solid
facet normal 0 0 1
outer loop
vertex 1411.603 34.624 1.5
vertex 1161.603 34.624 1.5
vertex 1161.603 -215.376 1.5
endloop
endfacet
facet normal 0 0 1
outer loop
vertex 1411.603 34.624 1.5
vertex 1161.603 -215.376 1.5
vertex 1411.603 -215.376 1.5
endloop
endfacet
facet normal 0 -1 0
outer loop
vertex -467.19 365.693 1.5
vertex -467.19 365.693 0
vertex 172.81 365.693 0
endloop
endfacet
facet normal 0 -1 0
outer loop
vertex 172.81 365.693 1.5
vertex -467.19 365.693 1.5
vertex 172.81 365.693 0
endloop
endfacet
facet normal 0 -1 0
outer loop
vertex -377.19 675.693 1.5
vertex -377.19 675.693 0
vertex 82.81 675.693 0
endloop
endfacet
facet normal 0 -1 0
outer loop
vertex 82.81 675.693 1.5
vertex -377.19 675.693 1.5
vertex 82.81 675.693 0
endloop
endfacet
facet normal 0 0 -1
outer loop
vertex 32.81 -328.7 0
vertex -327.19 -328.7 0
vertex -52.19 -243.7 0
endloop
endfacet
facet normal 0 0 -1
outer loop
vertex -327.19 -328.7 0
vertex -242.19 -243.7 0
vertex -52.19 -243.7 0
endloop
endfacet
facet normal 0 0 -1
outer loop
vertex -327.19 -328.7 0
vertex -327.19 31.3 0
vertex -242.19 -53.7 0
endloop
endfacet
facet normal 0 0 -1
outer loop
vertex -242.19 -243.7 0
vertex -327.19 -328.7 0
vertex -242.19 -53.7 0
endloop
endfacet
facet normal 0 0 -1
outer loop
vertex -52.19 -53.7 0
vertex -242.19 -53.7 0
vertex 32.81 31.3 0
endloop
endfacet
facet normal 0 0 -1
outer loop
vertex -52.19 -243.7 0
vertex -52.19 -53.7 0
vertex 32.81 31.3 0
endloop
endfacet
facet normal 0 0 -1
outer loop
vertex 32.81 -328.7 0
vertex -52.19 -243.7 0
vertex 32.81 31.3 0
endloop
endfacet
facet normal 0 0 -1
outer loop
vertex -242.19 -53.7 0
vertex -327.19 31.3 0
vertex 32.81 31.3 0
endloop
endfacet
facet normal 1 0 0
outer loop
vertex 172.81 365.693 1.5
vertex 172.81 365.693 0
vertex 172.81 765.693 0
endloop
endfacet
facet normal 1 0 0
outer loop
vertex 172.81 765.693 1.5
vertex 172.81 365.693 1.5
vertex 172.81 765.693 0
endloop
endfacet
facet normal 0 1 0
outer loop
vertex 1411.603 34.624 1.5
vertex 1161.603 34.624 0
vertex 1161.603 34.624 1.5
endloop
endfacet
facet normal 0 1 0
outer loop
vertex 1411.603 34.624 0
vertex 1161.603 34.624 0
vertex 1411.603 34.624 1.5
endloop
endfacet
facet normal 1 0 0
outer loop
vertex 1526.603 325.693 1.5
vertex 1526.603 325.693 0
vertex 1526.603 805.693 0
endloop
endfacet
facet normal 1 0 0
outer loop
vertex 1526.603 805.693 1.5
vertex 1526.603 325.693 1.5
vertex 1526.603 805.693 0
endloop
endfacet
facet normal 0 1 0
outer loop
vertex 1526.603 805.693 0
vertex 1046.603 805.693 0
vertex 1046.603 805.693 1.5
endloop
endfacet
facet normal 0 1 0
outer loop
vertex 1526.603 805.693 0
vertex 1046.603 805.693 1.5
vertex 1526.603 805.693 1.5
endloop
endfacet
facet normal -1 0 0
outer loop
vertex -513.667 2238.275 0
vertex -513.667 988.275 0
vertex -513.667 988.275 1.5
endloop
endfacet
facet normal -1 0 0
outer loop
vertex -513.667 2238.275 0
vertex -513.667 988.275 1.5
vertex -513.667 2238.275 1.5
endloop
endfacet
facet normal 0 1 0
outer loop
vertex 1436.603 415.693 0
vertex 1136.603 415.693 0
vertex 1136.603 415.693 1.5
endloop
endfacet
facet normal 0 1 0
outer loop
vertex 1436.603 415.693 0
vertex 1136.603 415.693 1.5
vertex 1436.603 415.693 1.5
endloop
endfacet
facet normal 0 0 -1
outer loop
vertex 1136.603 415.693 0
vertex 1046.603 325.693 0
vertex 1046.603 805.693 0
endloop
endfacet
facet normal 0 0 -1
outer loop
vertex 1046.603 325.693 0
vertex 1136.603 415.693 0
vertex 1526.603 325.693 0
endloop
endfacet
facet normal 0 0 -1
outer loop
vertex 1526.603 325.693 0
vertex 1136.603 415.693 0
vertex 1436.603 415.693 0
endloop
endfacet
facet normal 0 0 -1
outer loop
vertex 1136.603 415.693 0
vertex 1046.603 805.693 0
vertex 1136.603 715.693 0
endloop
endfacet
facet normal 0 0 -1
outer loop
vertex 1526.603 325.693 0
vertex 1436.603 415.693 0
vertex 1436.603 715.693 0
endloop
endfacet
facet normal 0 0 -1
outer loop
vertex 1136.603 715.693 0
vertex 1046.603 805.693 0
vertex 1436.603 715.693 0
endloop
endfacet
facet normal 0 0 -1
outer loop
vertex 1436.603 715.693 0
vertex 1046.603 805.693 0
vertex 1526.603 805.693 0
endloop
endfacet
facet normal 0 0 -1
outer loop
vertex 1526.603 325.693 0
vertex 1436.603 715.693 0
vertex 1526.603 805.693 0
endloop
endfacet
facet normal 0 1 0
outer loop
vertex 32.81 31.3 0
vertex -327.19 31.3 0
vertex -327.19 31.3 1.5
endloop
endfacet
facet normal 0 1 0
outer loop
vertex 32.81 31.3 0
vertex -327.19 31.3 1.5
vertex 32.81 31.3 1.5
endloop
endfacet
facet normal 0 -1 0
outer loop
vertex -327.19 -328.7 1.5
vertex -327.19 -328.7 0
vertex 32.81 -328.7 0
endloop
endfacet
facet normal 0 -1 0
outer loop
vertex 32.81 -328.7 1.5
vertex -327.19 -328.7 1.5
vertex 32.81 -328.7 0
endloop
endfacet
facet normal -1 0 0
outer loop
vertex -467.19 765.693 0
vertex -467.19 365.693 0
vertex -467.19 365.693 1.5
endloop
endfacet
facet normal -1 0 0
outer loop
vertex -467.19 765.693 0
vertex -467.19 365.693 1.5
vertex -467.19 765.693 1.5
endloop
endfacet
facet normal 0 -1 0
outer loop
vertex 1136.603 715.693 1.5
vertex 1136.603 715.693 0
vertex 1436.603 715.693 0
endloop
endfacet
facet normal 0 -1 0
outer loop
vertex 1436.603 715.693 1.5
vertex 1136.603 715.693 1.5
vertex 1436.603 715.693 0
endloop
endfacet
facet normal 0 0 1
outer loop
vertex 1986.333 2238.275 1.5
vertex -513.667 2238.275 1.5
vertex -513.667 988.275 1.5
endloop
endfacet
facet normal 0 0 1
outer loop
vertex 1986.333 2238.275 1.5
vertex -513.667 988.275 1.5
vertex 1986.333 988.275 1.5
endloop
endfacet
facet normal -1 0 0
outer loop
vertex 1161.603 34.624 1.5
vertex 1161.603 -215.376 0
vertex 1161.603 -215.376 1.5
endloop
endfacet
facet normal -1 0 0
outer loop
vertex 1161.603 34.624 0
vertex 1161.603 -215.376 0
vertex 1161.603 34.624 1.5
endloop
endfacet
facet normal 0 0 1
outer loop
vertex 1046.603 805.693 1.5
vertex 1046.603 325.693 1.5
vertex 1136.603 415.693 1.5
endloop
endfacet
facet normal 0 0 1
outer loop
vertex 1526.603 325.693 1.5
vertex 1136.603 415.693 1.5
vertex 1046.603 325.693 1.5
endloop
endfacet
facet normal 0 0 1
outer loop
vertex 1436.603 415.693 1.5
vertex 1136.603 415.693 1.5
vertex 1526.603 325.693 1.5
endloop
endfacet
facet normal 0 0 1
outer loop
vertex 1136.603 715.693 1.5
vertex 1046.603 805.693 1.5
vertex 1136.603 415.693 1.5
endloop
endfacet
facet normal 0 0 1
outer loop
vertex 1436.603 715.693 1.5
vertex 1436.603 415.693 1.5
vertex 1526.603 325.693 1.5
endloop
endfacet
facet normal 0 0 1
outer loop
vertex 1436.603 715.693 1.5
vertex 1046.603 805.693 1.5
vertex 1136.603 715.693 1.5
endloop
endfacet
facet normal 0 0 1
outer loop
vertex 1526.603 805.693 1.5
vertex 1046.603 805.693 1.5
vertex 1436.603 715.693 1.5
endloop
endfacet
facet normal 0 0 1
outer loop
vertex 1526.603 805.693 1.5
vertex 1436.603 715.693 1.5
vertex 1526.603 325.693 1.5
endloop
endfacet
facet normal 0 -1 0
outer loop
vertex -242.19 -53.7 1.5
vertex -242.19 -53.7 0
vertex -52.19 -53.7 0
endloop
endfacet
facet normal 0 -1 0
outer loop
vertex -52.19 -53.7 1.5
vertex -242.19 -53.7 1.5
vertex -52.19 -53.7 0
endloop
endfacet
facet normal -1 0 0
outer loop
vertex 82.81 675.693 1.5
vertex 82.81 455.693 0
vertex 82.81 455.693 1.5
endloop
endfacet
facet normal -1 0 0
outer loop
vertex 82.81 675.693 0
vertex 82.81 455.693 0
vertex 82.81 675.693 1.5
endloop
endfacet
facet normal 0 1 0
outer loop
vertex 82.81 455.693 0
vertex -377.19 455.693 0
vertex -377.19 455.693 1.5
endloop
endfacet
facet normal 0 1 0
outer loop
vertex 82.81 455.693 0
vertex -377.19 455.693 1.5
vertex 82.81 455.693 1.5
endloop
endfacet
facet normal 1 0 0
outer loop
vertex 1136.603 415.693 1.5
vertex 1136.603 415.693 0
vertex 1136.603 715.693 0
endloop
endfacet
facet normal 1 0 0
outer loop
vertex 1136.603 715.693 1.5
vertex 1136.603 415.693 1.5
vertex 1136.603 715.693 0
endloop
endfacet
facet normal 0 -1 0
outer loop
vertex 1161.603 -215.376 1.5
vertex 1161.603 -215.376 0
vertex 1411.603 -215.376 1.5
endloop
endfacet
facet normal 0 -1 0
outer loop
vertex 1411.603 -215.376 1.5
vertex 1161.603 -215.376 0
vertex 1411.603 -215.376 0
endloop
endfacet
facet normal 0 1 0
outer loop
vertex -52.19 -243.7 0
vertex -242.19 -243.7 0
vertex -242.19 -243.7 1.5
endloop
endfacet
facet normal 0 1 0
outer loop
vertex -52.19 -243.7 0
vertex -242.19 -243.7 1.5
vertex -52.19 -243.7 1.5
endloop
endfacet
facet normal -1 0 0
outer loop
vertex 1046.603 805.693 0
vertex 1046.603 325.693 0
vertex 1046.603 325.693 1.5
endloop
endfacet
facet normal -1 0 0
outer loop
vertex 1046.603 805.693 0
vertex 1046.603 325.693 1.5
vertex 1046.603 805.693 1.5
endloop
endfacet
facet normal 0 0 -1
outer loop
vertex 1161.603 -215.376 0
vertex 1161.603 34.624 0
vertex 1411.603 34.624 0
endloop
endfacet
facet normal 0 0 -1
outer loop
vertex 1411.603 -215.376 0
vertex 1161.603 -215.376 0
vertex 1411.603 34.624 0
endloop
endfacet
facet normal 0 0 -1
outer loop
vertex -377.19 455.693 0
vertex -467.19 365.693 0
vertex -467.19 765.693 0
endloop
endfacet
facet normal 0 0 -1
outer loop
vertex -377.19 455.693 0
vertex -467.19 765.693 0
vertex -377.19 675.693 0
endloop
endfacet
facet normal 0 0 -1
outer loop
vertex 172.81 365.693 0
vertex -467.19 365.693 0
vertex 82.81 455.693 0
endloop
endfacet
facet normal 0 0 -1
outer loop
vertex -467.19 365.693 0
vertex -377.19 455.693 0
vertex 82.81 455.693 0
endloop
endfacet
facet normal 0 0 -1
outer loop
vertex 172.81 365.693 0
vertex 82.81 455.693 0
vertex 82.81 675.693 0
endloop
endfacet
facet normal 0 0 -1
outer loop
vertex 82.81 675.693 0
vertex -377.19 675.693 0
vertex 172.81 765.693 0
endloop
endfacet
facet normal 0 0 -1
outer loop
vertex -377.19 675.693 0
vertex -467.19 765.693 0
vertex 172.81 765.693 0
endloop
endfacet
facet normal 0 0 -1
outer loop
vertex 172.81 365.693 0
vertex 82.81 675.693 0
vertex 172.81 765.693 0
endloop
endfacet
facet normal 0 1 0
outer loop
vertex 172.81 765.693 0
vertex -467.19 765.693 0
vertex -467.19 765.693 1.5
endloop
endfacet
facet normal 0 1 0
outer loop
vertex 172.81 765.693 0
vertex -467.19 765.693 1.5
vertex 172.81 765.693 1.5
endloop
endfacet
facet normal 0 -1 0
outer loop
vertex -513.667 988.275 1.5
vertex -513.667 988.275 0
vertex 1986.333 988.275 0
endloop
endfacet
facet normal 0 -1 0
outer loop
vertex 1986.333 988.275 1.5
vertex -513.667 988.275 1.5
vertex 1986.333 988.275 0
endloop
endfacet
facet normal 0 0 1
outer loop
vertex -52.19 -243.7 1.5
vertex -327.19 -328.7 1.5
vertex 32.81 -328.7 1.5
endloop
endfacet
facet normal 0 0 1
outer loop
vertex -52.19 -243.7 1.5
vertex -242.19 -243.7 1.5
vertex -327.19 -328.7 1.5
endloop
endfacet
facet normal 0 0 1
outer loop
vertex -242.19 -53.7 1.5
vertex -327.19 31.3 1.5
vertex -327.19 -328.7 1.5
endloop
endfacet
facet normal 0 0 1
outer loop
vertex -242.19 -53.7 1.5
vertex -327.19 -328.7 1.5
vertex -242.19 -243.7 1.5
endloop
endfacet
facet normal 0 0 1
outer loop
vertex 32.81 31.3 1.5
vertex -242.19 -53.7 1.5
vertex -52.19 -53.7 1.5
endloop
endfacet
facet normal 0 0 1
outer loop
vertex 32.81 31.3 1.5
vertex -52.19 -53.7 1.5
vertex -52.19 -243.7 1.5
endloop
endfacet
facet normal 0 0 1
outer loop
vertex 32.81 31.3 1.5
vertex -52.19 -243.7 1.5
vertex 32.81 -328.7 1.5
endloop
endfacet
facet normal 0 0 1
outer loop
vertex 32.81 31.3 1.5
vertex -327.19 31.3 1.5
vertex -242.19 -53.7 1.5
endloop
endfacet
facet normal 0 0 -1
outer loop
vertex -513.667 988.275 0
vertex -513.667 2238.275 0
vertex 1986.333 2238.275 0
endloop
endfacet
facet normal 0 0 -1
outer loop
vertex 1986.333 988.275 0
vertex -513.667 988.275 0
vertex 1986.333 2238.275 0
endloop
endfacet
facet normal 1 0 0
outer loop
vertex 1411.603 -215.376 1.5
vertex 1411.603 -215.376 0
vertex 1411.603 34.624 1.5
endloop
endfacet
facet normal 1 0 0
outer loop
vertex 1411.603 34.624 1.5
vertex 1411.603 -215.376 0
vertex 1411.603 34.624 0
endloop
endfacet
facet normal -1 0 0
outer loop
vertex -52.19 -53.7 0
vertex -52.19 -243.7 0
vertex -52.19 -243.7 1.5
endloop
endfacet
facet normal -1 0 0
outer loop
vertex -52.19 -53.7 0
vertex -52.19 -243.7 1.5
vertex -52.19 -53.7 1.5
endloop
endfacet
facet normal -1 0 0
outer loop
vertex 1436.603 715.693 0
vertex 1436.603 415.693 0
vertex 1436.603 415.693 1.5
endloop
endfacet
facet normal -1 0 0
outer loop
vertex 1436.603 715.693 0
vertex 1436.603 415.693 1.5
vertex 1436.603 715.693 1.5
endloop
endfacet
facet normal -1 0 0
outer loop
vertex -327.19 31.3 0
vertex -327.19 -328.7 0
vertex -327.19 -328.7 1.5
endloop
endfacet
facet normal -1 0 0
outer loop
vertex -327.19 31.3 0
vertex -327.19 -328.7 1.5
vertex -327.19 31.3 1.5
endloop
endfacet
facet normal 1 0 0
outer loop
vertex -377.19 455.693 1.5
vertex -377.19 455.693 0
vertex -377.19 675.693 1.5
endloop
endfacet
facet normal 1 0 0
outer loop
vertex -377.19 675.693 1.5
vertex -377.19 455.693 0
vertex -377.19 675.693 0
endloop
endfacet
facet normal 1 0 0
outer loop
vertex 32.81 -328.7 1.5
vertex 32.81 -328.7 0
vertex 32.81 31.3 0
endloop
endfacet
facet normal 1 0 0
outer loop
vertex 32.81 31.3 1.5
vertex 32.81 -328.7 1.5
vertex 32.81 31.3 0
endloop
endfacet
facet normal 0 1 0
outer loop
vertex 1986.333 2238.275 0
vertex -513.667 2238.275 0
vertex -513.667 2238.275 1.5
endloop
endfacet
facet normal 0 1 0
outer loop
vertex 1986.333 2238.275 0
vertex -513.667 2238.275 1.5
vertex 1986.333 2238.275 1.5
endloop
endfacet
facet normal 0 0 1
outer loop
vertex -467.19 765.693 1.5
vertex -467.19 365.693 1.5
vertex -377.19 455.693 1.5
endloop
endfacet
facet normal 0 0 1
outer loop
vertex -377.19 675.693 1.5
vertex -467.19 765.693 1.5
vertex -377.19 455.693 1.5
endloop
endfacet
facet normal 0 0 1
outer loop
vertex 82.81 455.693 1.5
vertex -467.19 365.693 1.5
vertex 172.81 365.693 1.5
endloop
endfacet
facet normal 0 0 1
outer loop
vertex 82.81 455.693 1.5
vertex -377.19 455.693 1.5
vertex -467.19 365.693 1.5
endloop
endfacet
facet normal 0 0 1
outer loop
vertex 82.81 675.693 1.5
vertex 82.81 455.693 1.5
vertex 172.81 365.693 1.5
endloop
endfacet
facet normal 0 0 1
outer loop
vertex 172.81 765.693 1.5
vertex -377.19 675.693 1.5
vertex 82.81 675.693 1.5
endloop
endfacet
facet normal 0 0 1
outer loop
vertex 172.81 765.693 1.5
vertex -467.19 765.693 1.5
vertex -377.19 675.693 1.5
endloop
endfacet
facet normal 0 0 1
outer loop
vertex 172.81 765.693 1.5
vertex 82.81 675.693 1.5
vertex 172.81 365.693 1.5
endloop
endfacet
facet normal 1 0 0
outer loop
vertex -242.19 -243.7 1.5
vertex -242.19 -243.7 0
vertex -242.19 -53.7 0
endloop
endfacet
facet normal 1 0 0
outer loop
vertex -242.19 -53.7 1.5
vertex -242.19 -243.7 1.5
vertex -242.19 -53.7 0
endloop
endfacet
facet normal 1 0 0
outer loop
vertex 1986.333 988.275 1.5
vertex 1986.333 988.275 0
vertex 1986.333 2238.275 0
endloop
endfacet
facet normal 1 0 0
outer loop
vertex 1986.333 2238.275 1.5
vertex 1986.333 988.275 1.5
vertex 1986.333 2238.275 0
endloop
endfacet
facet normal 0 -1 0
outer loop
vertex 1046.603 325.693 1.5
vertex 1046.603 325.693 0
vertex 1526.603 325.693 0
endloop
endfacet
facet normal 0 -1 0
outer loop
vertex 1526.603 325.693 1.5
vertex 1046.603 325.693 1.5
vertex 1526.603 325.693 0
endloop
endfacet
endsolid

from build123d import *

# Parameters (mm, degrees)
F0_W     = 640
F0_H     = 400
F0_W_2   = 460
F0_H_2   = 220
F1_DEPTH = 1.5
F0_W_3   = 480
F0_H_3   = 480
F0_W_4   = 300
F0_H_4   = 300
F0_W_5   = 250
F0_H_5   = 250
F0_W_6   = 360
F0_H_6   = 360
F0_W_7   = 190
F0_H_7   = 190
F2_DEPTH = 1.5
F3_W     = 2500
F3_H     = 1250
F4_DEPTH = 1.5


with BuildPart() as f1:
    # F0 (on Top) → F1 (new body)
    with BuildSketch(Plane.XY):
        with Locations((-147.190171, 565.693362)):
            Rectangle(F0_W, F0_H)
        with Locations((-147.190171, 565.693362)):
            Rectangle(F0_W_2, F0_H_2, mode=Mode.SUBTRACT)
    extrude(amount=F1_DEPTH)


with BuildPart() as f2:
    # F0 (on Top) → F2 (new body)
    with BuildSketch(Plane.XY):
        with Locations((1286.602703, 565.693362)):
            Rectangle(F0_W_3, F0_H_3)
        with Locations((1286.602703, 565.693362)):
            Rectangle(F0_W_4, F0_H_4, mode=Mode.SUBTRACT)
        with Locations((1286.602703, -90.376285)):
            Rectangle(F0_W_5, F0_H_5)
        with Locations((-147.190171, -148.700306)):
            Rectangle(F0_W_6, F0_H_6)
        with Locations((-147.190171, -148.700306)):
            Rectangle(F0_W_7, F0_H_7, mode=Mode.SUBTRACT)
    extrude(amount=F2_DEPTH)


with BuildPart() as f4:
    # F3 (on Top) → F4 (new body)
    with BuildSketch(Plane.XY):
        with Locations((736.332655, 1613.274813)):
            Rectangle(F3_W, F3_H)
    extrude(amount=F4_DEPTH)


solid = Compound([f1.part, f2.part, f4.part])
